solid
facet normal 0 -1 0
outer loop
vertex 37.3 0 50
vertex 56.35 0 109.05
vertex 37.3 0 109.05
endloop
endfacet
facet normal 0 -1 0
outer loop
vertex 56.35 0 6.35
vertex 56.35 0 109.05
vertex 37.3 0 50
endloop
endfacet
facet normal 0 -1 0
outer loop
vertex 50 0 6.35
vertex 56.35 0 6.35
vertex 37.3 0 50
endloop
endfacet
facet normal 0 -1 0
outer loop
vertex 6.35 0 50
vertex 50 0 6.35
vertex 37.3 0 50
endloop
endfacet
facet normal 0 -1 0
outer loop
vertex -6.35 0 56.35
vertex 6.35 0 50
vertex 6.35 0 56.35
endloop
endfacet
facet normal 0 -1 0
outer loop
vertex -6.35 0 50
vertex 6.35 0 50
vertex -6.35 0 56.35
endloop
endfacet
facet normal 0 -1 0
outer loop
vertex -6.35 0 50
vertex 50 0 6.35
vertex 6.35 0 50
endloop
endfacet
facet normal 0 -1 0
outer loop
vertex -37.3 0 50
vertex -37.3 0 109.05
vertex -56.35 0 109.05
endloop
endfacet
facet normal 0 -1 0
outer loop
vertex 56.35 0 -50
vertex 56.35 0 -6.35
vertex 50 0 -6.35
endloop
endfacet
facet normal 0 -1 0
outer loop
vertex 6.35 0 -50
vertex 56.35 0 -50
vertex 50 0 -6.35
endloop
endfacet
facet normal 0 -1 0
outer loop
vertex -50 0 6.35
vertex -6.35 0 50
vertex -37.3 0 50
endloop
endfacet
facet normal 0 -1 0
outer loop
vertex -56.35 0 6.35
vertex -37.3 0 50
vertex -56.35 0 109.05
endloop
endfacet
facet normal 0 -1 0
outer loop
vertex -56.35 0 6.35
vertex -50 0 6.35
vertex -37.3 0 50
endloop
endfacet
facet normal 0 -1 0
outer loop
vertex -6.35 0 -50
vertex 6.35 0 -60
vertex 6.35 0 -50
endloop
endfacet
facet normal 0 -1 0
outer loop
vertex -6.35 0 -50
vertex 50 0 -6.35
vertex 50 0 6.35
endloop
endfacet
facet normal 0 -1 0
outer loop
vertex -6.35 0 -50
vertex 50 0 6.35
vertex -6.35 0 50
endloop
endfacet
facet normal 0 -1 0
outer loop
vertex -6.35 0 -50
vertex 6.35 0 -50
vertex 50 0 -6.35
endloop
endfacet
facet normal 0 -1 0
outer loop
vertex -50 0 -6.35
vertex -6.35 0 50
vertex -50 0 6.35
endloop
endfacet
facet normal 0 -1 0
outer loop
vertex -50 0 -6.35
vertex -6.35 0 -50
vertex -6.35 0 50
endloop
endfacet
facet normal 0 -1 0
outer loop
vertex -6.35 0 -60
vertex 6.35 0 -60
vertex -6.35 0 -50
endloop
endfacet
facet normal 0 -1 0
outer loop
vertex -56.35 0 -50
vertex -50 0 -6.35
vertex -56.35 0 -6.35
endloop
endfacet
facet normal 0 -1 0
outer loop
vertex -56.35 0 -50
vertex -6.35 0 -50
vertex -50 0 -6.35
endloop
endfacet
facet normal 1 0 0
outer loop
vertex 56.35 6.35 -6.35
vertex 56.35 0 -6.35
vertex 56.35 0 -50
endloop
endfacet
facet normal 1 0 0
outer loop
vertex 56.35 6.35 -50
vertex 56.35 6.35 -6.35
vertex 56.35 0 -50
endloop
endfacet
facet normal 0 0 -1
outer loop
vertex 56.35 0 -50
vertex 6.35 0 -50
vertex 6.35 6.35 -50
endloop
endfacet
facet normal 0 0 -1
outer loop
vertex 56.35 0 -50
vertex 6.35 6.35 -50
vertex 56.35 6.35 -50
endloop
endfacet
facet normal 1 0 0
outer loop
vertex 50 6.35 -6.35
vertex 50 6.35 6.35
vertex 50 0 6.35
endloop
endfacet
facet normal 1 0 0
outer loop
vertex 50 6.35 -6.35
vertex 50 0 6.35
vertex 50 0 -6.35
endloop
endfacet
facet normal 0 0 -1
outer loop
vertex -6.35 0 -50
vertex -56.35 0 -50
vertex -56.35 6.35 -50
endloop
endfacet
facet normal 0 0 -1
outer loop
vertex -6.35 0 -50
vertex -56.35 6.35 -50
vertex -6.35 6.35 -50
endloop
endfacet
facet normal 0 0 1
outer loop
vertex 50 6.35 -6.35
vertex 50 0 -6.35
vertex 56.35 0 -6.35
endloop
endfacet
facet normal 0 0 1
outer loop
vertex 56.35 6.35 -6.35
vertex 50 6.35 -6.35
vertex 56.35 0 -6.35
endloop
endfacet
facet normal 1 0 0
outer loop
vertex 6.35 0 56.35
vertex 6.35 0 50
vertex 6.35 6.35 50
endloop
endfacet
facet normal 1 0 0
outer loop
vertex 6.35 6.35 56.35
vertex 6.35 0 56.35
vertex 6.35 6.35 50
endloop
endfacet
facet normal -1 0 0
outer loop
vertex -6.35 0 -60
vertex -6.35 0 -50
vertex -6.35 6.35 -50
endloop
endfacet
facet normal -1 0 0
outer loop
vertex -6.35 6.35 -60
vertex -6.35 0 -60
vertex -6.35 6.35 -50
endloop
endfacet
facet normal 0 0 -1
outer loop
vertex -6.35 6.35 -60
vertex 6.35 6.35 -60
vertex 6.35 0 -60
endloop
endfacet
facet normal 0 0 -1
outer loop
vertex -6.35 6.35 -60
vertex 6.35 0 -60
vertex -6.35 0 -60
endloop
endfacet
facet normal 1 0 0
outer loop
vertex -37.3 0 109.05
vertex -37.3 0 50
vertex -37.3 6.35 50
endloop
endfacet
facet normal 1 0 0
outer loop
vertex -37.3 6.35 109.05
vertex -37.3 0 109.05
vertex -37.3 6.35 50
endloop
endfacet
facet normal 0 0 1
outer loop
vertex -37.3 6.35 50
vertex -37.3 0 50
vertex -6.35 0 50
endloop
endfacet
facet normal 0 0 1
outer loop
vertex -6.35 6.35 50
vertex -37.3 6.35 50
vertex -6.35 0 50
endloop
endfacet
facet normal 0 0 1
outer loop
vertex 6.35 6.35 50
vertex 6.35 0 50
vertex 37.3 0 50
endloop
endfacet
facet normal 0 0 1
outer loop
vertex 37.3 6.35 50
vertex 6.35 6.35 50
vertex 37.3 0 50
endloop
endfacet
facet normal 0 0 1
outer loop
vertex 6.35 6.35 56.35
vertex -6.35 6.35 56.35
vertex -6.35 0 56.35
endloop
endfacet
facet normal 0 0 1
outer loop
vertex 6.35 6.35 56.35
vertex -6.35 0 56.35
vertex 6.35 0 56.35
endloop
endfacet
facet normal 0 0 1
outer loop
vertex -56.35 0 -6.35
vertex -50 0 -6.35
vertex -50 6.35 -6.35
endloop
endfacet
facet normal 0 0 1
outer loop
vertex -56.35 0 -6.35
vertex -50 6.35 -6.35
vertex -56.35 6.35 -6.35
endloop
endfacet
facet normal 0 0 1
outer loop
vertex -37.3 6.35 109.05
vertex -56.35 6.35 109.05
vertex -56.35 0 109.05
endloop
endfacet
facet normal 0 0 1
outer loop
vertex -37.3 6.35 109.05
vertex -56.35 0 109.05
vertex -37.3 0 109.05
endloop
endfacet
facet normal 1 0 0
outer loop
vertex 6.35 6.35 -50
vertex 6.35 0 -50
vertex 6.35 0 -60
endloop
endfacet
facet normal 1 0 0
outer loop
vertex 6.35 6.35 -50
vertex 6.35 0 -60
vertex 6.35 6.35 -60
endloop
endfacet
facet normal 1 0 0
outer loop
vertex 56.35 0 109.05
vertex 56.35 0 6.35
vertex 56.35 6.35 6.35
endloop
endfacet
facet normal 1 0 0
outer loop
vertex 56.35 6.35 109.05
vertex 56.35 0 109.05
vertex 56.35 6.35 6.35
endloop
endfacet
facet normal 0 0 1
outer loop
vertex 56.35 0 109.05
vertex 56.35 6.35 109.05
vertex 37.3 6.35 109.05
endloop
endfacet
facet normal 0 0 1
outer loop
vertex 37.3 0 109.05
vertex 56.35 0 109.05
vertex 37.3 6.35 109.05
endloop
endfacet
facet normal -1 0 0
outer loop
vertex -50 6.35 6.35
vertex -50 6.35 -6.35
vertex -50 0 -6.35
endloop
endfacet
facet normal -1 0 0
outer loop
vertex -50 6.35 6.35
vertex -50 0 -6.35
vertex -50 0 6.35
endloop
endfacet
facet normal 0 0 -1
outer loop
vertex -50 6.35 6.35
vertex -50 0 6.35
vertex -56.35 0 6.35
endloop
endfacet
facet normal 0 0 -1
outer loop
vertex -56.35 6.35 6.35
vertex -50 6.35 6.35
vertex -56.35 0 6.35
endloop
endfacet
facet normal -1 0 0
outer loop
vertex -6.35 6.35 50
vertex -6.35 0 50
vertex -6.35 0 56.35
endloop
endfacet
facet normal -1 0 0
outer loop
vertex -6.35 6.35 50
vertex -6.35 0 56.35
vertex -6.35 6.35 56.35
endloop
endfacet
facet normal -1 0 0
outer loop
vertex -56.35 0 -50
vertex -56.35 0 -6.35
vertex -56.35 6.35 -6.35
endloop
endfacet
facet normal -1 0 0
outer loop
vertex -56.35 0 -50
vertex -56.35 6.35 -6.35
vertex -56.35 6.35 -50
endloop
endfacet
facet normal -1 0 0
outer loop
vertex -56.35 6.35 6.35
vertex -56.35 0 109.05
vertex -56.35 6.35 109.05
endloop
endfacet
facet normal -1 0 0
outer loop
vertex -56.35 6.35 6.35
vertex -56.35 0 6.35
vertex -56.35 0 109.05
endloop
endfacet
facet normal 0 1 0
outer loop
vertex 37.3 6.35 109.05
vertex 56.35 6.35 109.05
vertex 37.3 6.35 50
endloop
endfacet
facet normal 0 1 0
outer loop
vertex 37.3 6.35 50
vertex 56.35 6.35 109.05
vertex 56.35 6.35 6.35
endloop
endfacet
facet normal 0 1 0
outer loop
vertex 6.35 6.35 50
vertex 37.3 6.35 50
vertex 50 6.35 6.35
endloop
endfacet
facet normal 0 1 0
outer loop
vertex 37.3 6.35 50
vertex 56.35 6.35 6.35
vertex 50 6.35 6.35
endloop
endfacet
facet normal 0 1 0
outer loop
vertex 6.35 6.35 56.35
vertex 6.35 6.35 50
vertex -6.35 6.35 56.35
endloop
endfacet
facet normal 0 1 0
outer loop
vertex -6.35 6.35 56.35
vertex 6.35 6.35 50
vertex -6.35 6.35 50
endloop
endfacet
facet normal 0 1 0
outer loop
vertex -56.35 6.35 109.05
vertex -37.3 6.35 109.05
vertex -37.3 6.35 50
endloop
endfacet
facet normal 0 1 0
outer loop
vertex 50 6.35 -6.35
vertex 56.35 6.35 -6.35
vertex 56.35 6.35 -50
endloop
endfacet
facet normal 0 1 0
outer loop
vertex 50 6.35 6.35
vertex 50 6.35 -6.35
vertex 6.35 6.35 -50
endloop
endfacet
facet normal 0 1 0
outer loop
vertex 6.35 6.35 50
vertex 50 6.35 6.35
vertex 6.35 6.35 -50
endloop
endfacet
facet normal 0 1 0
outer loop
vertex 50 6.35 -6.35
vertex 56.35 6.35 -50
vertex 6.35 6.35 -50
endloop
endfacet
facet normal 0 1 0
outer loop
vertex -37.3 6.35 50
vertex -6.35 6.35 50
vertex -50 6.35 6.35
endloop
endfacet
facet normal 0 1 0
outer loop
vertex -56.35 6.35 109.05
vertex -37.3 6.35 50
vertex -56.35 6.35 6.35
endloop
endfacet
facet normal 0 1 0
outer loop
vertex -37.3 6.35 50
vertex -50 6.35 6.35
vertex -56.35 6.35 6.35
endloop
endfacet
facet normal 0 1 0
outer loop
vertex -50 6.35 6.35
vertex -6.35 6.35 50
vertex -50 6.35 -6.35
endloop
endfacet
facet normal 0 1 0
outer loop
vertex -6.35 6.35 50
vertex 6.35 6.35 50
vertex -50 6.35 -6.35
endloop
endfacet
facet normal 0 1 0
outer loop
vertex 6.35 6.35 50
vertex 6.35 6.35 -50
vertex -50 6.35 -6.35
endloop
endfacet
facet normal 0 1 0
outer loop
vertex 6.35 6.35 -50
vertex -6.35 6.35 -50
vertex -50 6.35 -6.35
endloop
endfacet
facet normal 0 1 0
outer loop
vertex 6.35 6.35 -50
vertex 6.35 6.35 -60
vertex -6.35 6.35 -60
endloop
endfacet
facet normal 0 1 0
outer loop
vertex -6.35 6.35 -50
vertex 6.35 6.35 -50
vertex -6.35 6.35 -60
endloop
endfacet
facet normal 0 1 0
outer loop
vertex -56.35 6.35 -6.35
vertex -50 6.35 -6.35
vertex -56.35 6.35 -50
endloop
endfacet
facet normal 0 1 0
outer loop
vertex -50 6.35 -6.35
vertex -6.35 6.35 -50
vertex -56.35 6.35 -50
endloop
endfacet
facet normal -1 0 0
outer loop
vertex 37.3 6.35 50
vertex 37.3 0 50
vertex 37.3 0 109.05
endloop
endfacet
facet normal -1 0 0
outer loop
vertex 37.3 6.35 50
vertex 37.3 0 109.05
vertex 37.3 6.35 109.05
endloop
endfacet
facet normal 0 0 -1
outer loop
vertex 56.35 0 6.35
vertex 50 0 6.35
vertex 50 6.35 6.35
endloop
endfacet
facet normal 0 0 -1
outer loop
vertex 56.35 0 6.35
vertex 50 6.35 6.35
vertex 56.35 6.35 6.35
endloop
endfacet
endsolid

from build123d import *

# Parameters (mm, degrees)
SKETCH1_W           = 112.7
SKETCH1_H           = 100
BOSS_EXTRUDE1_DEPTH = 6.35
SKETCH2_W           = 6.35
SKETCH2_H           = 12.7
CUT_EXTRUDE1_DEPTH  = 76.601884897
CIRPATTERN1_COUNT   = 2
SKETCH5_W           = 12.7
SKETCH5_H           = 6.35
BOSS_EXTRUDE2_DEPTH = 6.35
SKETCH6_W           = 19.05
SKETCH6_H           = 6.35
BOSS_EXTRUDE3_DEPTH = 59.05
SKETCH7_W           = 12.7
SKETCH7_H           = 6.35
BOSS_EXTRUDE4_DEPTH = 10


with BuildPart() as part:
    # Sketch1 → Boss-Extrude1 (new body)
    with BuildSketch(Plane(origin=(0, 0, 0), x_dir=(1, 0, 0), z_dir=(0, 1, 0))):
        Rectangle(SKETCH1_W, SKETCH1_H)
    extrude(amount=BOSS_EXTRUDE1_DEPTH)

    # Sketch2 → Cut-Extrude1 (cut, through all)
    with BuildSketch(Plane(origin=(0, 6.35, 0), x_dir=(1, 0, 0), z_dir=(0, 1, 0))):
        with Locations((53.175, 0)):
            Rectangle(SKETCH2_W, SKETCH2_H)
    cut_extrude1 = extrude(amount=-CUT_EXTRUDE1_DEPTH, mode=Mode.SUBTRACT)

    # CirPattern1: Cut-Extrude1 ×2 about axis
    cirpattern1_axis = Axis((0, 6.35, 0), (0, 1, 0))
    for i in range(1, CIRPATTERN1_COUNT):
        add(cut_extrude1.rotate(cirpattern1_axis, i * 360 / CIRPATTERN1_COUNT), mode=Mode.SUBTRACT)

    # Sketch5 → Boss-Extrude2 (add)
    with BuildSketch(Plane.XY.offset(50)):
        with Locations((0, 3.175)):
            Rectangle(SKETCH5_W, SKETCH5_H)
    extrude(amount=BOSS_EXTRUDE2_DEPTH)

    # Sketch6 → Boss-Extrude3 (add)
    with BuildSketch(Plane.XY.offset(50)):
        with Locations((-46.825, 3.175)):
            Rectangle(SKETCH6_W, SKETCH6_H)
    boss_extrude3 = extrude(amount=BOSS_EXTRUDE3_DEPTH)

    # Mirror1: Boss-Extrude3 across plane
    add(boss_extrude3.mirror(Plane(origin=(0, 0, 0), x_dir=(0, 0, 1), z_dir=(1, 0, 0))))

    # Sketch7 → Boss-Extrude4 (add)
    with BuildSketch(Plane(origin=(0, 0, -50), x_dir=(-1, 0, 0), z_dir=(0, 0, -1))):
        with Locations((0, 3.175)):
            Rectangle(SKETCH7_W, SKETCH7_H)
    extrude(amount=BOSS_EXTRUDE4_DEPTH)


solid = part.part
